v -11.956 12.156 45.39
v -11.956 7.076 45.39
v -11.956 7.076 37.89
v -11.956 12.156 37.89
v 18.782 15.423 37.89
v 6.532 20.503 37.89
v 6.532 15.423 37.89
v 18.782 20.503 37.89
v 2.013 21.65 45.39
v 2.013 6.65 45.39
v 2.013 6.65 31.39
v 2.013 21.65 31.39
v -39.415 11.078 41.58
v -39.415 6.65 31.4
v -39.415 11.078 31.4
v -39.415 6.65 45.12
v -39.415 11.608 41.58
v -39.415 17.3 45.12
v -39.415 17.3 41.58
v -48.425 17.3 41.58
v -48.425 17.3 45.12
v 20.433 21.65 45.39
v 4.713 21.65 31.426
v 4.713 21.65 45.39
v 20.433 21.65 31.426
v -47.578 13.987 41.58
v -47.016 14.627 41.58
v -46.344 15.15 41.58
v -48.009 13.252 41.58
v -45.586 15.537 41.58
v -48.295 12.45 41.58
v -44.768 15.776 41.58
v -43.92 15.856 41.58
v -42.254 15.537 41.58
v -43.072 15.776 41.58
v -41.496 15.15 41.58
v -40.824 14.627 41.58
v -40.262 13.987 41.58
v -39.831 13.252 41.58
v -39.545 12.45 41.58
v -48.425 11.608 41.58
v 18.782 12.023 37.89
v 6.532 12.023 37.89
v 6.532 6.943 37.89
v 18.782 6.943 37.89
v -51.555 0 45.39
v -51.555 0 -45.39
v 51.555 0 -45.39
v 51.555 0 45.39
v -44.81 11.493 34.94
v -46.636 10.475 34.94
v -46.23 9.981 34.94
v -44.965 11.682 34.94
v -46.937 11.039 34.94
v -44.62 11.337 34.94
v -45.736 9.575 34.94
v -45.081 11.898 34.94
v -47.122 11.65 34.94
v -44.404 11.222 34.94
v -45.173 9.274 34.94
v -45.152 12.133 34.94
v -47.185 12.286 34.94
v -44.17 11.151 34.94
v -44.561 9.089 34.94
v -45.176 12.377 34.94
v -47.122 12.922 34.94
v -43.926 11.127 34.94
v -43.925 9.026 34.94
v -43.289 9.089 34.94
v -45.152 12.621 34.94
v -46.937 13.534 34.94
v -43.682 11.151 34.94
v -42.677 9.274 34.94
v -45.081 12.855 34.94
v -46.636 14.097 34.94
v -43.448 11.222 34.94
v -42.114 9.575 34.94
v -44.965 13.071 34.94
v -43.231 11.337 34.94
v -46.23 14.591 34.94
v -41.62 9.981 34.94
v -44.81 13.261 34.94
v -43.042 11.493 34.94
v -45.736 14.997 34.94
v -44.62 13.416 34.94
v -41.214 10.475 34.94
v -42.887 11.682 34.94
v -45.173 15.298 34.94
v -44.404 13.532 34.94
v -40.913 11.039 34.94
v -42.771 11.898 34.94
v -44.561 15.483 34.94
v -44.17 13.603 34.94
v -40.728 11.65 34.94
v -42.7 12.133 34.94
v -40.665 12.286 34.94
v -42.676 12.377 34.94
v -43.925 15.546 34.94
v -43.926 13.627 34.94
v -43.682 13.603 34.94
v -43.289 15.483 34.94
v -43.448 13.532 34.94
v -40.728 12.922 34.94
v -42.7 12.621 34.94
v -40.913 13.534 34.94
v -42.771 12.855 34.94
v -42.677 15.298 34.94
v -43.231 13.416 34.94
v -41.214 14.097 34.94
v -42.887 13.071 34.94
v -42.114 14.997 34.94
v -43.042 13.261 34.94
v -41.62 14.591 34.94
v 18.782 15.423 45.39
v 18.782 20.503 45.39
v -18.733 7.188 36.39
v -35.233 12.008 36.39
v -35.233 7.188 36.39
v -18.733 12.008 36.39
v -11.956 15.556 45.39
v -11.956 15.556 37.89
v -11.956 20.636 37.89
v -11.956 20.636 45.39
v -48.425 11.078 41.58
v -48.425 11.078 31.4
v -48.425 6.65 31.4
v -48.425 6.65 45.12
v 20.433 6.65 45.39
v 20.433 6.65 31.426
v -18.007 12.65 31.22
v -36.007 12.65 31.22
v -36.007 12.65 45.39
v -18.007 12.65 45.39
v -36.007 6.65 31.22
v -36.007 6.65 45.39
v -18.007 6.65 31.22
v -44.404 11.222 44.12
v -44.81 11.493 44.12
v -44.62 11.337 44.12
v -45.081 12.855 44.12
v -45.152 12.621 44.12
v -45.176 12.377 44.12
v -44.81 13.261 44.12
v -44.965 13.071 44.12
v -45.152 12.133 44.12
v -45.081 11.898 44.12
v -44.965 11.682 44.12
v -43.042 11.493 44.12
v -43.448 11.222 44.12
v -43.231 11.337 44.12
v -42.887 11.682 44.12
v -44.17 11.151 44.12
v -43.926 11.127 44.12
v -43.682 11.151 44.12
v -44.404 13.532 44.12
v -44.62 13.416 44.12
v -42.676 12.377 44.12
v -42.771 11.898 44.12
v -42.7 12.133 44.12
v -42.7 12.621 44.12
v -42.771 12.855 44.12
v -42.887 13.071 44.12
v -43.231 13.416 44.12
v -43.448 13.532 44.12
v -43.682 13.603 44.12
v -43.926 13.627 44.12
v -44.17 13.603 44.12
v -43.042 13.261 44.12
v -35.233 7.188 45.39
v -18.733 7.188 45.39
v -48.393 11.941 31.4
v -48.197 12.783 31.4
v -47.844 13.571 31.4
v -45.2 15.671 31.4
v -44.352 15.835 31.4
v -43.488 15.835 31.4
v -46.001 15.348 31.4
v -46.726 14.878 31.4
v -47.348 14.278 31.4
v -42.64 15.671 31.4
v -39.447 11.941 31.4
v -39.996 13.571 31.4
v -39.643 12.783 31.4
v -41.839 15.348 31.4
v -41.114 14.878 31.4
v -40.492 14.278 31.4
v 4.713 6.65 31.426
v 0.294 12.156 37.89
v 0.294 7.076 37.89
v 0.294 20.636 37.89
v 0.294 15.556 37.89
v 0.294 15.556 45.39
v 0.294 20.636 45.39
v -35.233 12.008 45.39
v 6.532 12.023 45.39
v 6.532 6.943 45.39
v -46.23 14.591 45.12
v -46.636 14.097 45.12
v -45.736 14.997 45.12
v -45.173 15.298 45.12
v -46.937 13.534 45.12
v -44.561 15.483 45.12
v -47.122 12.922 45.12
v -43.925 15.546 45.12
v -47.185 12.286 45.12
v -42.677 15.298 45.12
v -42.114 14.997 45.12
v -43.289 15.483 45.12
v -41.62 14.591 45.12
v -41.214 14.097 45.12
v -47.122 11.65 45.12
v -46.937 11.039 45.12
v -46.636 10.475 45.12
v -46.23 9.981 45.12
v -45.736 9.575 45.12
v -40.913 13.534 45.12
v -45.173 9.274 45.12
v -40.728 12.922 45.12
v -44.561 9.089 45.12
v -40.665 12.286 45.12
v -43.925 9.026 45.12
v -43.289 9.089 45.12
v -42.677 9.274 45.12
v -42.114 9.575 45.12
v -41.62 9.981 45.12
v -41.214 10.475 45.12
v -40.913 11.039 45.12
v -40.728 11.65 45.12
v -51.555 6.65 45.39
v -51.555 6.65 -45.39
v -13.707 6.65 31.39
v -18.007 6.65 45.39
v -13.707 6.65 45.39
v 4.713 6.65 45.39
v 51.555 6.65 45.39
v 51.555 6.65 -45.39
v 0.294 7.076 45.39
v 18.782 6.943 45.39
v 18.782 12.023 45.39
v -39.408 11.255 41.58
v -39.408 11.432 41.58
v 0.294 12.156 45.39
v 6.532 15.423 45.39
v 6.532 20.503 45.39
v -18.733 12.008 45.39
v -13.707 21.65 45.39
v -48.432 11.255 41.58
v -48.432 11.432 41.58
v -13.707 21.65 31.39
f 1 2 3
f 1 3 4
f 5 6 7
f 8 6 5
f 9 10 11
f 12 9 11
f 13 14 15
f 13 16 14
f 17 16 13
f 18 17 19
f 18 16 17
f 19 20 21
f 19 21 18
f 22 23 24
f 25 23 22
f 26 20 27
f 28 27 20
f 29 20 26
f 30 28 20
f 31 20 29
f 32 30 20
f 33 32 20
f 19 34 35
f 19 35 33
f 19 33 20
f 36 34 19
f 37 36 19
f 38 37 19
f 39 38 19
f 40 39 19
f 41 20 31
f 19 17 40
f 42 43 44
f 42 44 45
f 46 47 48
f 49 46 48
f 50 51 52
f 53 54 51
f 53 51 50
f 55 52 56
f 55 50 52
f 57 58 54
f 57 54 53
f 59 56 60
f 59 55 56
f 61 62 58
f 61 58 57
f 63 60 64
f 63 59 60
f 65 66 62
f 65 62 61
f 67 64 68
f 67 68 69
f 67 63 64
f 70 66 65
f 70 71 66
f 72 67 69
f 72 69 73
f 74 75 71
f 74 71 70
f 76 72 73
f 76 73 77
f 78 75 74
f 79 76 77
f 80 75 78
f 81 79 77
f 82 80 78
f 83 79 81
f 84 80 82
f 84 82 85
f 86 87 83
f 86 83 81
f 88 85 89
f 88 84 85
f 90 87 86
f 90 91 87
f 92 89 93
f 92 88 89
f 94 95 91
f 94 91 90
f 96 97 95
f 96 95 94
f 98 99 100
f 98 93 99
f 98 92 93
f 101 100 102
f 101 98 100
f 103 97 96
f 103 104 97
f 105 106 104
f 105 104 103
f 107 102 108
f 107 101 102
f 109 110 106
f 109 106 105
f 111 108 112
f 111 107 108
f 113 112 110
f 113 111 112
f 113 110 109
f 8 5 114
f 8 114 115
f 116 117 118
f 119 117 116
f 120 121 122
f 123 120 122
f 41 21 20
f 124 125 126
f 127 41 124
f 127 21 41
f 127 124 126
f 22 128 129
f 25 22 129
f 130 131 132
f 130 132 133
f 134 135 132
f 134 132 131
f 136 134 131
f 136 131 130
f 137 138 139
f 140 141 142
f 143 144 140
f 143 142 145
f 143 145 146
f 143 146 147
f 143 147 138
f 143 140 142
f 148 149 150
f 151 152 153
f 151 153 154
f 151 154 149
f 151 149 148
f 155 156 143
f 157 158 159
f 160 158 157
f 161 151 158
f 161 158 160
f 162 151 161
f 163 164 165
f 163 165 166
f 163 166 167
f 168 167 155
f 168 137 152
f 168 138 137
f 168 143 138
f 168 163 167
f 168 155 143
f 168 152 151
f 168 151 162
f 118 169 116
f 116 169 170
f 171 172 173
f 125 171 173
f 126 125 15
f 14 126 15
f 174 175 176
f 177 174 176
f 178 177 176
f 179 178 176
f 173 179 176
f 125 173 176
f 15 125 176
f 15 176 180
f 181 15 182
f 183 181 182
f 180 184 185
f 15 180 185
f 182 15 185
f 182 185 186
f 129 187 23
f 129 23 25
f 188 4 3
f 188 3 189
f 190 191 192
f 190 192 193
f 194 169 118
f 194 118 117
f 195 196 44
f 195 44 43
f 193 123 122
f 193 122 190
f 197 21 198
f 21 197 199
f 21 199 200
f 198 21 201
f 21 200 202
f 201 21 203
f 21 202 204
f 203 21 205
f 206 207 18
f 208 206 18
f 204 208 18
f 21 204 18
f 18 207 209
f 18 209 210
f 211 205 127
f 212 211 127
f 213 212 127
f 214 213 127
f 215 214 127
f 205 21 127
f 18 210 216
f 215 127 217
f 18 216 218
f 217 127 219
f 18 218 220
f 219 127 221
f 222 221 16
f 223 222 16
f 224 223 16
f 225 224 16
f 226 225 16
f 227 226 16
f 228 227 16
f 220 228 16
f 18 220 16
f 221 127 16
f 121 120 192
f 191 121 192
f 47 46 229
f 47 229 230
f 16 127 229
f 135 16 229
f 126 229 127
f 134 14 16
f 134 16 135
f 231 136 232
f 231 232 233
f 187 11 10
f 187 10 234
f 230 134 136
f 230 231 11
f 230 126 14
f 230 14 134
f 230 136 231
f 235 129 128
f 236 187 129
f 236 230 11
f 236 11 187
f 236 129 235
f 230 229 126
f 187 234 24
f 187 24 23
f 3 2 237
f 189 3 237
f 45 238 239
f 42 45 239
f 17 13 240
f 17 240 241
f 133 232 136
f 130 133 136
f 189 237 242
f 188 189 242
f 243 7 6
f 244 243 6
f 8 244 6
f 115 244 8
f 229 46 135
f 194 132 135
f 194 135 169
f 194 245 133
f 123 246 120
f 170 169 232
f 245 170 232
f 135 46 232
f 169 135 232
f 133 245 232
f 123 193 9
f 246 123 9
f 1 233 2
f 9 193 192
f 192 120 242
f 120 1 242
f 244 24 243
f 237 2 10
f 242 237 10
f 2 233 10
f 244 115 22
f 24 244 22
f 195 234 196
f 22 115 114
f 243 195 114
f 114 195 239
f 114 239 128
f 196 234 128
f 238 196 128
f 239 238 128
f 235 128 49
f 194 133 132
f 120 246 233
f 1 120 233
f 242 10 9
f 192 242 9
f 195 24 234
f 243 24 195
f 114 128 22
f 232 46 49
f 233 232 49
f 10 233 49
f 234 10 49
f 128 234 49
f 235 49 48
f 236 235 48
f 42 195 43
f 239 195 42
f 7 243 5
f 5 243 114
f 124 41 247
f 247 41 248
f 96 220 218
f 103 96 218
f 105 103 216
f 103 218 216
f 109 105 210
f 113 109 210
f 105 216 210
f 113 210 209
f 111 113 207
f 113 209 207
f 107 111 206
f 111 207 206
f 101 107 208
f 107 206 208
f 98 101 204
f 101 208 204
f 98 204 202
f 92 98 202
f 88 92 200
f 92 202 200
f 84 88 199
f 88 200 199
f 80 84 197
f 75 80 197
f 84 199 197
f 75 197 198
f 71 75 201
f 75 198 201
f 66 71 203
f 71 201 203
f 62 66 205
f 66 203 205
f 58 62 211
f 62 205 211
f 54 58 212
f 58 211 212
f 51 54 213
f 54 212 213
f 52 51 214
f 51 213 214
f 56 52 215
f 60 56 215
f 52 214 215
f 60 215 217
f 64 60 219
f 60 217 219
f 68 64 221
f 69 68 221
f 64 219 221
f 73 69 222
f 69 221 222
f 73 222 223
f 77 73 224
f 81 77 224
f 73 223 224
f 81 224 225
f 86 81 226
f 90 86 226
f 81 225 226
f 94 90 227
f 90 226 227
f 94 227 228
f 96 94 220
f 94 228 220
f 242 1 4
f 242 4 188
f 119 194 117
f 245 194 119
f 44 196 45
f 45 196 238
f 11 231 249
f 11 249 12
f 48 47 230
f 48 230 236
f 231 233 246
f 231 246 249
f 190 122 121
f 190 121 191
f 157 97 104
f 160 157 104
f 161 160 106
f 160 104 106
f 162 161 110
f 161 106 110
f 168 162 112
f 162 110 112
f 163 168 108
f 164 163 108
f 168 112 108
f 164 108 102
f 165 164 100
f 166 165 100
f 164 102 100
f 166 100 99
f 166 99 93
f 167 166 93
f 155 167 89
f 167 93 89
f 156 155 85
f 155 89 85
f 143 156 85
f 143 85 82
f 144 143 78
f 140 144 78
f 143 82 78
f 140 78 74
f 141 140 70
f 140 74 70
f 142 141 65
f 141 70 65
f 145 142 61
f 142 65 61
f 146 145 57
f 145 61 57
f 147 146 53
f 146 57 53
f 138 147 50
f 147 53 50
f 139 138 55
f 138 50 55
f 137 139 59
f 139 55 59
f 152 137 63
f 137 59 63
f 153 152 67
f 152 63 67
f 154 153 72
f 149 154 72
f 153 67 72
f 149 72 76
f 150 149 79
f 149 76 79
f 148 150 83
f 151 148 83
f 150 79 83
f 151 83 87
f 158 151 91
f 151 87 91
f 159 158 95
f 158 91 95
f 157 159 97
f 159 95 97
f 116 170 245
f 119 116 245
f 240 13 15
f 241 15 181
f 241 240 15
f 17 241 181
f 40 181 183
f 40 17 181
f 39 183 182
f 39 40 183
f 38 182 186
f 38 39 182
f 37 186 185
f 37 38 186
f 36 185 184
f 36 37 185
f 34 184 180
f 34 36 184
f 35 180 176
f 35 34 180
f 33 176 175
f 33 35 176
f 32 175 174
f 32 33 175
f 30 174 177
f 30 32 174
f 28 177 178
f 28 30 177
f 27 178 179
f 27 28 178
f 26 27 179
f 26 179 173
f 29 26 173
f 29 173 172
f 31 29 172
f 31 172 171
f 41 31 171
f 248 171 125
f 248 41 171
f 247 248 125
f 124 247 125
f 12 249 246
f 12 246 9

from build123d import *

# Parameters (mm, degrees)
SKETCH1_W           = 103.11
SKETCH1_H           = 90.78
BOSS_EXTRUDE1_DEPTH = 6.65
SKETCH2_W           = 9.01
SKETCH2_H           = 3.54
BOSS_EXTRUDE2_DEPTH = 10.65
BOSS_EXTRUDE3_DEPTH = 10.18
SKETCH4_R           = 3.26
CUT_EXTRUDE1_DEPTH  = 10.18
SKETCH6_R           = 1.25
BOSS_EXTRUDE4_DEPTH = 9.18
SKETCH7_W           = 18
SKETCH7_H           = 14.17
BOSS_EXTRUDE5_DEPTH = 6
SKETCH8_W           = 16.5
SKETCH8_H           = 4.82
CUT_EXTRUDE2_DEPTH  = 9
SKETCH9_W           = 15.72
SKETCH9_H           = 14
BOSS_EXTRUDE6_DEPTH = 15
SKETCH10_W          = 12.25
SKETCH10_H          = 5.08
CUT_EXTRUDE3_DEPTH  = 7.5
SKETCH12_W          = 15.72
SKETCH12_H          = 13.964065117
BOSS_EXTRUDE7_DEPTH = 15
SKETCH13_W          = 12.25
SKETCH13_H          = 5.08
CUT_EXTRUDE4_DEPTH  = 7.5


with BuildPart() as part:
    # Sketch1 → Boss-Extrude1 (new body)
    with BuildSketch(Plane(origin=(0, 0, 0), x_dir=(1, 0, 0), z_dir=(0, 1, 0))):
        Rectangle(SKETCH1_W, SKETCH1_H)
    extrude(amount=BOSS_EXTRUDE1_DEPTH)

    # Sketch2 → Boss-Extrude2 (add)
    with BuildSketch(Plane(origin=(0, 6.65, 0), x_dir=(1, 0, 0), z_dir=(0, 1, 0))):
        with Locations((-43.92, -43.350225169)):
            Rectangle(SKETCH2_W, SKETCH2_H)
    extrude(amount=BOSS_EXTRUDE2_DEPTH)

    # Sketch3 → Boss-Extrude3 (add)
    with BuildSketch(Plane(origin=(0, 0, 41.580225169), x_dir=(-1, 0, 0), z_dir=(0, 0, -1))):
        with BuildLine():
            Line((39.415, 6.65), (39.415, 11.078180036))
            ThreePointArc((39.415, 11.078180036), (43.92, 15.856037514), (48.425, 11.078180036))
            Line((48.425, 11.078180036), (48.425, 6.65))
            Line((48.425, 6.65), (39.415, 6.65))
        make_face()
    extrude(amount=BOSS_EXTRUDE3_DEPTH)

    # Sketch4 → Cut-Extrude1 (cut)
    with BuildSketch(Plane.XY.offset(45.120225169)):
        with Locations((-43.925, 12.286078197)):
            Circle(SKETCH4_R)
    extrude(amount=-CUT_EXTRUDE1_DEPTH, mode=Mode.SUBTRACT)

    # Sketch6 → Boss-Extrude4 (add)
    with BuildSketch(Plane.XY.offset(34.940225169)):
        with Locations((-43.925906585, 12.376780876)):
            Circle(SKETCH6_R)
    extrude(amount=BOSS_EXTRUDE4_DEPTH)

    # Sketch7 → Boss-Extrude5 (add)
    with BuildSketch(Plane(origin=(0, 6.65, 0), x_dir=(1, 0, 0), z_dir=(0, 1, 0))):
        with Locations((-27.007208725, -38.305)):
            Rectangle(SKETCH7_W, SKETCH7_H)
    extrude(amount=BOSS_EXTRUDE5_DEPTH)

    # Sketch8 → Cut-Extrude2 (cut)
    with BuildSketch(Plane.XY.offset(45.39)):
        with Locations((-26.982569048, 9.597847623)):
            Rectangle(SKETCH8_W, SKETCH8_H)
    extrude(amount=-CUT_EXTRUDE2_DEPTH, mode=Mode.SUBTRACT)

    # Sketch9 → Boss-Extrude6 (add)
    with BuildSketch(Plane(origin=(0, 6.65, 0), x_dir=(1, 0, 0), z_dir=(0, 1, 0))):
        with Locations((-5.847208725, -38.39)):
            Rectangle(SKETCH9_W, SKETCH9_H)
    extrude(amount=BOSS_EXTRUDE6_DEPTH)

    # Sketch10 → Cut-Extrude3 (cut)
    with BuildSketch(Plane.XY.offset(45.39)):
        with Locations((-5.831324622, 18.0957287)):
            Rectangle(SKETCH10_W, SKETCH10_H)
        with Locations((-5.831324622, 9.615530297)):
            Rectangle(SKETCH10_W, SKETCH10_H)
    extrude(amount=-CUT_EXTRUDE3_DEPTH, mode=Mode.SUBTRACT)

    # Sketch12 → Boss-Extrude7 (add)
    with BuildSketch(Plane(origin=(0, 6.65, 0), x_dir=(1, 0, 0), z_dir=(0, 1, 0))):
        with Locations((12.572791275, -38.407967442)):
            Rectangle(SKETCH12_W, SKETCH12_H)
    extrude(amount=BOSS_EXTRUDE7_DEPTH)

    # Sketch13 → Cut-Extrude4 (cut)
    with BuildSketch(Plane.XY.offset(45.39)):
        with Locations((12.656700486, 17.962850519)):
            Rectangle(SKETCH13_W, SKETCH13_H)
        with Locations((12.656700486, 9.482652117)):
            Rectangle(SKETCH13_W, SKETCH13_H)
    extrude(amount=-CUT_EXTRUDE4_DEPTH, mode=Mode.SUBTRACT)


solid = part.part
